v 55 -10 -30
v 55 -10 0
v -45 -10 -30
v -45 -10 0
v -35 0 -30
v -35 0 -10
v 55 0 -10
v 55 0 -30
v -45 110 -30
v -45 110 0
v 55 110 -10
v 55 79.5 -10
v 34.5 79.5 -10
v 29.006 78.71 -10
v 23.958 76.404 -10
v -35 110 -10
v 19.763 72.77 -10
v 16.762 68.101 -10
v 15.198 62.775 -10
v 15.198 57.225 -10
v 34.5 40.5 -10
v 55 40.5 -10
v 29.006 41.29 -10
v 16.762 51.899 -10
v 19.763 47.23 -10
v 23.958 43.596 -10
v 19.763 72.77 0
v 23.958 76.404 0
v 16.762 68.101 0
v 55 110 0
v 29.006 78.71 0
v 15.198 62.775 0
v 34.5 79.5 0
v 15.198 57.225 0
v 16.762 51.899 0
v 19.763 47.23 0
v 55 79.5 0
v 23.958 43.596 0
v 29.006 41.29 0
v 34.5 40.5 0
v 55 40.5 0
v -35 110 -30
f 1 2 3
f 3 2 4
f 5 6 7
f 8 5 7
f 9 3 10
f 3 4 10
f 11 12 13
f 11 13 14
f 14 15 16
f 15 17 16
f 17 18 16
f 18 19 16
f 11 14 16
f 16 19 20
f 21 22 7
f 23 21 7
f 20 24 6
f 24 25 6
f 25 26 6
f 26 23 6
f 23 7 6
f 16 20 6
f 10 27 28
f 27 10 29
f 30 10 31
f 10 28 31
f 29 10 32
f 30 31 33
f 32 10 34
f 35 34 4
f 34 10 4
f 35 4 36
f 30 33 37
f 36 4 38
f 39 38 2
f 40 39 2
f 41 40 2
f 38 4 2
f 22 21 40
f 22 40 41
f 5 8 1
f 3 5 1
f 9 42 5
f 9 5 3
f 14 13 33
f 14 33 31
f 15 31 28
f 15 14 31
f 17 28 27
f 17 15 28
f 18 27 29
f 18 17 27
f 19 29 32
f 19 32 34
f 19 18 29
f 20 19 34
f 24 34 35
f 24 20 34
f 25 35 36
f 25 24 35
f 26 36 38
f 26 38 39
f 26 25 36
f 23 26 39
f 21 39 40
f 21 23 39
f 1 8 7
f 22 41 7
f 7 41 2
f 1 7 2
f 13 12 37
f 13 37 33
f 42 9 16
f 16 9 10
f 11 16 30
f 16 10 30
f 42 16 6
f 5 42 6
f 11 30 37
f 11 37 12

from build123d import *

# Parameters (mm, degrees)
BOSS_EXTRUDE1_DEPTH = 60
SKETCH4_W           = 10
SKETCH4_H           = 90
BOSS_EXTRUDE2_DEPTH = 45
SKETCH6_W           = 25
SKETCH6_H           = 10
BOSS_EXTRUDE3_DEPTH = 45
SKETCH8_W           = 10
SKETCH8_H           = 15
BOSS_EXTRUDE4_DEPTH = 90
CUT_EXTRUDE1_DEPTH  = 10
BOSS_EXTRUDE5_DEPTH = 20
CUT_EXTRUDE2_DEPTH  = 5
SKETCH12_W          = 10
SKETCH12_H          = 30.5
CUT_EXTRUDE3_DEPTH  = 5
BOSS_EXTRUDE6_DEPTH = 5


with BuildPart() as part:
    # Sketch1 → Boss-Extrude1 (new body)
    with BuildSketch(Plane(origin=(0, 0, 0), x_dir=(0, 0, -1), z_dir=(1, 0, 0))):
        Polygon((0, -10), (0, 90), (10, 90), (10, 0), (25, 0), (25, -10), align=None)
    extrude(amount=BOSS_EXTRUDE1_DEPTH)

    # Sketch4 → Boss-Extrude2 (add)
    with BuildSketch(Plane.ZY):
        with Locations((-5, 45)):
            Rectangle(SKETCH4_W, SKETCH4_H)
    extrude(amount=BOSS_EXTRUDE2_DEPTH)

    # Sketch6 → Boss-Extrude3 (add)
    with BuildSketch(Plane.ZY):
        with Locations((-12.5, -5)):
            Rectangle(SKETCH6_W, SKETCH6_H)
    extrude(amount=BOSS_EXTRUDE3_DEPTH)

    # Sketch8 → Boss-Extrude4 (add)
    with BuildSketch(Plane(origin=(0, 0, 0), x_dir=(1, 0, 0), z_dir=(0, 1, 0))):
        with Locations((-40, 17.5)):
            Rectangle(SKETCH8_W, SKETCH8_H)
    extrude(amount=BOSS_EXTRUDE4_DEPTH)

    # Sketch9 → Cut-Extrude1 (cut)
    with BuildSketch(Plane(origin=(0, 0, -10), x_dir=(-1, 0, 0), z_dir=(0, 0, -1))):
        with BuildLine():
            Line((-34.5, 40.5), (-60, 40.5))
            Line((-60, 40.5), (-60, 79.5))
            Line((-60, 79.5), (-34.5, 79.5))
            ThreePointArc((-34.5, 79.5), (-15, 60), (-34.5, 40.5))
        make_face()
    extrude(amount=-CUT_EXTRUDE1_DEPTH, mode=Mode.SUBTRACT)

    # Sketch10 → Boss-Extrude5 (add)
    with BuildSketch(Plane(origin=(0, 90, 0), x_dir=(1, 0, 0), z_dir=(0, 1, 0))):
        Polygon((60, 10), (-35, 10), (-35, 25), (-45, 25), (-45, 0), (60, 0), align=None)
    extrude(amount=BOSS_EXTRUDE5_DEPTH)

    # Sketch11 → Cut-Extrude2 (cut)
    with BuildSketch(Plane(origin=(60, 0, 0), x_dir=(0, 0, -1), z_dir=(1, 0, 0))):
        Polygon((10, 0), (10, 40.5), (0, 40.5), (0, -10), (25, -10), (25, 0), align=None)
    extrude(amount=-CUT_EXTRUDE2_DEPTH, mode=Mode.SUBTRACT)

    # Sketch12 → Cut-Extrude3 (cut)
    with BuildSketch(Plane(origin=(60, 0, 0), x_dir=(0, 0, -1), z_dir=(1, 0, 0))):
        with Locations((5, 94.75)):
            Rectangle(SKETCH12_W, SKETCH12_H)
    extrude(amount=-CUT_EXTRUDE3_DEPTH, mode=Mode.SUBTRACT)

    # Sketch13 → Boss-Extrude6 (add)
    with BuildSketch(Plane(origin=(0, 0, -25), x_dir=(-1, 0, 0), z_dir=(0, 0, -1))):
        Polygon((35, 0), (-55, 0), (-55, -10), (45, -10), (45, 110), (35, 110), align=None)
    extrude(amount=BOSS_EXTRUDE6_DEPTH)


solid = part.part
